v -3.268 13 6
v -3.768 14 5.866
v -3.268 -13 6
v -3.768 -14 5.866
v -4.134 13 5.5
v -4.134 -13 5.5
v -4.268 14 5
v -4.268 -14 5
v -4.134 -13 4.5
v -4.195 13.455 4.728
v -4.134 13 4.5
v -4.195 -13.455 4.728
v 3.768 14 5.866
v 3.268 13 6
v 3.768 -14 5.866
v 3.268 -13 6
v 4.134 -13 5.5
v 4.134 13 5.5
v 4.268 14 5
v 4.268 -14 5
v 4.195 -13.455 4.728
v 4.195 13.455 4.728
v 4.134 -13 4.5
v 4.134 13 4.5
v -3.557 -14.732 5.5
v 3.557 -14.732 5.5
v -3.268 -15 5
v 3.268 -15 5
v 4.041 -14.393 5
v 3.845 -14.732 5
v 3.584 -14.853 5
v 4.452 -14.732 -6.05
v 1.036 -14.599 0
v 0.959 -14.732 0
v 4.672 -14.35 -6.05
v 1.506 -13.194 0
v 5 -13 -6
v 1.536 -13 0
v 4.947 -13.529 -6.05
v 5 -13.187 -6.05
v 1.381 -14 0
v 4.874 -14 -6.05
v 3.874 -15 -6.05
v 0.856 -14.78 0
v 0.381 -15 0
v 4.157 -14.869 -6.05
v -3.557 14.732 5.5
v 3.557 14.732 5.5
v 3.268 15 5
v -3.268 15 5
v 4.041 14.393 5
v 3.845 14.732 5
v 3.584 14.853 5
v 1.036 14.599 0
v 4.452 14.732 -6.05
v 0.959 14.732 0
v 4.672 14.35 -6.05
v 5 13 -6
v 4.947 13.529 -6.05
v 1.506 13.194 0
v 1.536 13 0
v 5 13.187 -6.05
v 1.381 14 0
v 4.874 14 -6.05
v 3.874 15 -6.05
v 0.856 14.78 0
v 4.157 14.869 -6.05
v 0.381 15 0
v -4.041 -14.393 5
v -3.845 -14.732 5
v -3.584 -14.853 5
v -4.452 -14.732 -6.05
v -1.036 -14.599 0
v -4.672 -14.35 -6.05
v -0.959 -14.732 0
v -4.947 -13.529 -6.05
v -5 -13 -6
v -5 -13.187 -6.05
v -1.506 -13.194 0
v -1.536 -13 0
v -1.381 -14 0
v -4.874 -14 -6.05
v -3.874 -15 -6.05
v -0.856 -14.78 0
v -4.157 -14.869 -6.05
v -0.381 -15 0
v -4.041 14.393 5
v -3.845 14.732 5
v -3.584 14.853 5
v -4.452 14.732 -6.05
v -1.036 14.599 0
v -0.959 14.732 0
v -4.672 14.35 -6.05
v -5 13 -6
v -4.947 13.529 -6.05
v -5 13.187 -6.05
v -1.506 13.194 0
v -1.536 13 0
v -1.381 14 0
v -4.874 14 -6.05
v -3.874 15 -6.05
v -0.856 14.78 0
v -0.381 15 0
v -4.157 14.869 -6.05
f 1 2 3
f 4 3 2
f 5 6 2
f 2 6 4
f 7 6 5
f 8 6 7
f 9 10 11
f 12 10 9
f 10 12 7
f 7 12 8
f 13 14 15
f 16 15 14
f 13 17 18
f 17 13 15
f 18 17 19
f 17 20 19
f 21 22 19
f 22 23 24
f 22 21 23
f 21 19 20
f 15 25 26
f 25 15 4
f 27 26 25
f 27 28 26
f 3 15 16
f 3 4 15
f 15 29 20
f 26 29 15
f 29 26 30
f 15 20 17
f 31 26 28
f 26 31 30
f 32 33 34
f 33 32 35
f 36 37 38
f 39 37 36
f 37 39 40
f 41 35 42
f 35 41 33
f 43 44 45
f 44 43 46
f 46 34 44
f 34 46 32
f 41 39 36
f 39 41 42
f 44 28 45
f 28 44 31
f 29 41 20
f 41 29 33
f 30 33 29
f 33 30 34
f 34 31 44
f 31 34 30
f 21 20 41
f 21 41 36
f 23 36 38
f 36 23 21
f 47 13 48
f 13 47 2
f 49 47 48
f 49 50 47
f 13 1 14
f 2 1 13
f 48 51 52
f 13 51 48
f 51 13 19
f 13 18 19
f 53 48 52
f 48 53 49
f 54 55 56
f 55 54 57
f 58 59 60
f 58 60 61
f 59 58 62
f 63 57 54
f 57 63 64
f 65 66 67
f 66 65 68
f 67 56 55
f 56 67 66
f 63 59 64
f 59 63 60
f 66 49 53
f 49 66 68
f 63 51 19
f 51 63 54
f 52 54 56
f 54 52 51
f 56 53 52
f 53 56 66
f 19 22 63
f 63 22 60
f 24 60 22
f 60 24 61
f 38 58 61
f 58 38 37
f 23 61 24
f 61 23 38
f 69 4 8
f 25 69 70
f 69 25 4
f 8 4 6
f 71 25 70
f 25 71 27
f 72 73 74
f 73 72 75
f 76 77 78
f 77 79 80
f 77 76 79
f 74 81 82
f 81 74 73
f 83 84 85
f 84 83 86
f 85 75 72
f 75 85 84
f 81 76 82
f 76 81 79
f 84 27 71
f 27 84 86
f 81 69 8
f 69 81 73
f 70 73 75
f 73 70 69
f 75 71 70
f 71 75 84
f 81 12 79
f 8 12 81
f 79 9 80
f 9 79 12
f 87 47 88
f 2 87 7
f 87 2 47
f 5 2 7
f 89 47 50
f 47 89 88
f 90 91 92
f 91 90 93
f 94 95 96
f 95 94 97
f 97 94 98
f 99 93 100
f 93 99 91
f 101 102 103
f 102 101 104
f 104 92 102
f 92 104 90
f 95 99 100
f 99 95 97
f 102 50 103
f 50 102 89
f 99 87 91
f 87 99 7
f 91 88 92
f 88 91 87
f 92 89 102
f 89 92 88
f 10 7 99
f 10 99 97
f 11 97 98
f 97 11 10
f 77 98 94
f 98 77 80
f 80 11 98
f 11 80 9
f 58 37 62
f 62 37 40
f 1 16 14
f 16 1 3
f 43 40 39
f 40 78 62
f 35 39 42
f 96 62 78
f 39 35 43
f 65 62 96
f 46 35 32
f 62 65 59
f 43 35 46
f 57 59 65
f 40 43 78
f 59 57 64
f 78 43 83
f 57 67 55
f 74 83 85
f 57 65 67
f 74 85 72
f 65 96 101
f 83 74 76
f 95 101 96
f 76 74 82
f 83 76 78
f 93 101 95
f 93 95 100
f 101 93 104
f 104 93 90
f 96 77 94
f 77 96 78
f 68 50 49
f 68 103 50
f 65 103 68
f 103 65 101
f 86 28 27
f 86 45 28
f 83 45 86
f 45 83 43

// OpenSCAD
// file: config.scad
snappy_version = 1.0;


// 0 = Thinning Walls (Thin in the middle, thick at edges.  Prettier smooth solid walls.)
// 1 = Corrugated closed walls. (Zig-zagged solid walls. Less shrinkage stress.)
// 2 = Crossbeam walls. (Open sparse struts. Far less shrinkage stress. Recommended.)
wall_styling = 0;


platform_length = 100.0;  // mm.  Must be a multiple of rack_tooth_size.
platform_width  = 150.0;  // mm
platform_height =  40.0;  // mm
platform_thick  =   7.0;  // mm

rail_length     = 136.0;  // mm  Must be a multiple of lifter_screw_pitch
rail_height     =  50.0;  // mm
rail_thick      =   7.0;  // mm

motor_rail_length = 128.0; // mm

groove_angle    =  30;   // degrees
groove_height   =  12;   // mm

joiner_angle    =  30;   // degrees
joiner_width    =  10;   // mm

rack_tooth_size     =  5;    // mm per tooth.
rack_height         = 10;    // mm
rack_base           =  2;    // mm
gear_base           = 10;    // mm
gear_teeth          =  8;
set_screw_size      =  3;    // mm size of set screw in drive gears, couplers, etc
motor_length        = 39.25; // mm length of NEMA17 motor.
motor_shaft_size    =  5;    // mm diameter of NEMA17 motor shaft.
motor_shaft_length  = 20;    // mm length of exposed NEMA17 motor shaft.
motor_shaft_flatted = true;  // Is motor shaft keyed? (RECOMMENDED)

// Currently configured for 3/8" ACME threaded rod.
lifter_screw_diam   = 60.0; // mm
lifter_screw_thick  = 16.0; // mm
lifter_screw_pitch  =  8.0; // mm lift per revolution
lifter_screw_angle  = 50.0; // degrees tooth face angle

// Mechanical endstop bare microswitch.
endstop_hole_spacing =  9.5; // mm
endstop_hole_inset   =  8.0; // mm
endstop_hole_hoff    = 10.0; // mm
endstop_click_voff   =  3.0; // mm
endstop_screw_size   =  2.5; // mm
endstop_standoff     =  1.0; // mm
endstop_length       = 19.9; // mm
endstop_thick        =  6.7; // mm
endstop_depth        = 11.0; // mm

// Standard Mk2b Heated Build Platform from RepRapDiscount.com
hbp_width       = 215;   // mm
hbp_length      = 215;   // mm
hbp_hole_width  = 208.5; // mm
hbp_hole_length = 208.5; // mm
hbp_screwsize   =   3;   // mm

// Standard 200mm square borosilicate glass build platform
glass_width     = 214;   // mm
glass_length    = 200;   // mm
glass_thick     =   3;   // mm

// Cable chain dimensions
cable_chain_height = 13;  // mm
cable_chain_width  = 25;  // mm
cable_chain_length = 26;  // mm
cable_chain_pivot  =  6;  // mm
cable_chain_bump   =  1;  // mm
cable_chain_wall   =  3;  // mm

spool_holder_length = 140.0;  // mm

jhead_vent_span     =  20.0;  // mm
jhead_barrel_diam   =  16.0;  // mm
jhead_shelf_thick   =   4.8;  // mm
jhead_groove_thick  =   4.6;  // mm
jhead_groove_diam   =  12.0;  // mm
jhead_cap_height    =   8.2;  // mm
jhead_cap_diam      =  12.0;  // mm

extruder_length      = 133.3;  // mm
extruder_thick       =   5.0;  // mm
extruder_shaft_len   =  25.0;  // mm
extruder_drive_diam  =  12.5;  // mm

/*
// 626 bearing
extruder_idler_diam  =  19.0;  // mm
extruder_idler_axle  =   6.0;  // mm
extruder_idler_width =   6.0;  // mm
*/

/*
// SAE bearing 5/8"OD x 1/4"ID x 1/5"W
extruder_idler_diam  =  15.9;  // mm
extruder_idler_axle  =   6.3;  // mm
extruder_idler_width =   5.0;  // mm
*/

// 686 bearing
extruder_idler_diam  =  13.0;  // mm
extruder_idler_axle  =   6.0;  // mm
extruder_idler_width =   5.0;  // mm

extruder_fan_size    =  40.0;  // mm
extruder_fan_thick   =  10.0;  // mm

cooling_fan_size     =  40.0;  // mm
cooling_fan_thick    =  10.0;  // mm
cooling_duct_height  =  15.0;  // mm

filament_diam        =   1.75; // mm

// This is the slop needed to make parts fit more exactly, and might be
// printer dependant.  Printing a slop calibration plate should help
// dial this setting in for your printer.
printer_slop =   0.25;  // mm
gear_backlash = printer_slop/2;



// Commonly used derived values.  Don't change these.
shaft_clear = max(20.0, motor_shaft_length)-20.0;
rail_offset = shaft_clear+12.0;
rail_spacing = platform_width - joiner_width*4 - 10;
rail_width = rail_spacing + joiner_width*2;
motor_mount_spacing=43+joiner_width+10;
side_mount_spacing = motor_rail_length-10*2;
platform_z = rail_height+groove_height+rail_offset;
cantilever_length = (motor_rail_length+2*platform_length-2*rail_height-extruder_length-groove_height)/2;
motor_top_z = platform_z-platform_thick-rack_base-rack_height-gear_base-2;

wall_styles = ["thinwall", "corrugated", "crossbeams"];
wall_style = wall_styles[wall_styling];


// vim: noexpandtab tabstop=4 shiftwidth=4 softtabstop=4 nowrap
// main file
include <config.scad>
use <GDMUtils.scad>


module slider(l=30, w=joiner_width, h=groove_height, base=10, wall=5, ang=groove_angle, slop=0.2)
{
	w = w + 2*wall;
	h = h + base;

	difference() {
		// Overall slider shell
		up(h/2) cube([joiner_width+2*wall, l, h], center=true);

		up(base-printer_slop) {
			// Clear slider gap
			up((groove_height+5)/2) {
				cube([joiner_width+slop, l+1, groove_height+5], center=true);
			}

			// Horiz edge bevel
			yspread(l) {
				scale([1, 1, tan(30)]) {
					xrot(45) cube([joiner_width+slop, 2*sqrt(2), 2*sqrt(2)], center=true);
				}
			}
		}

		// Back top bevel
		up(h) {
			xspread(w) {
				yrot(45) {
					cube([wall/2*sqrt(2), l+1, wall/2*sqrt(2)], center=true);
				}
			}
		}
	}
	up(base) {
		up(groove_height/2) {
			xflip_copy() {
				left((joiner_width+slop)/2) {
					difference() {
						// Rails
						right_half() {
							scale([tan(ang), 1, 1]) {
								yrot(45) cube([groove_height*sin(45), l, groove_height*sin(45)], center=true);
							}
						}

						// Rail bevels
						yflip_copy() {
							right(sqrt(2)*groove_height/2) {
								fwd(l/2) {
									zrot(45) cube(groove_height, center=true);
								}
							}
						}
					}
				}
			}
		}
	}
}
//slider(l=30, base=10, wall=4, slop=0.2);



module rail(l=30, w=joiner_width, h=groove_height, fillet=1.0, ang=groove_angle)
{
	difference() {
		// Rail backing.
		down(0.05/2) cube(size=[w, l, h+0.05], center=true);

		xflip_copy() {
			left(w/2) {
				up(h/2) {
					zflip() {
						xrot(90) fillet_planes_joint_mask(h=l+1, r=fillet, ang=90-ang, $fn=12);
					}
				}
			}
		}

		// Rail grooves.
		xflip_copy() {
			right(w/2) {
				// main groove
				scale([tan(ang),1,1]) yrot(45) {
					cube(size=[h*sqrt(2)/2,l+1,h*sqrt(2)/2], center=true);
				}

				// fillets
				endfacets = 3;
				facelen = h/2/cos(ang);
				inset = h/2*tan(ang);
				yflip_copy() {
					fwd(l/2) {
						scale([1, 2, 1]) {
							up(h/2) {
								// top end fillets
								difference() {
									cube([w*2, fillet*2, fillet*2], center=true);
									back(fillet) down(fillet) {
										yrot(90) cylinder(r=fillet, h=w*3, center=true, $fn=endfacets*4);
									}
								}

								// top corner end fillets
								down(fillet/sin(ang)) {
									yrot(45+ang/2) {
										difference() {
											cube([w*2, fillet*2, fillet*2], center=true);
											back(fillet) down(fillet) {
												yrot(90) cylinder(r=fillet, h=w*3, center=true, $fn=endfacets*4);
											}
										}
									}
								}
							}

							// groove fillets
							left(inset) {
								difference() {
									zflip_copy() {
										left(fillet/cos(ang)) {
											yrot(-ang) {
												right(fillet) {
													down(facelen*1.5/2) {
														cube([fillet*2, fillet*2, facelen*1.5], center=true);
													}
												}
											}
										}
									}
									zflip_copy() {
										left(fillet/cos(ang)) {
											yrot(-ang) {
												right(fillet) {
													down(facelen) {
														back(fillet) left(fillet) {
															cylinder(r=fillet, h=facelen*3, center=true, $fn=endfacets*4);
														}
													}
												}
											}
										}
									}
								}
							}
						}
					}
				}
			}
		}
	}
}
rail(l=30);


// vim: noexpandtab tabstop=4 shiftwidth=4 softtabstop=4 nowrap
